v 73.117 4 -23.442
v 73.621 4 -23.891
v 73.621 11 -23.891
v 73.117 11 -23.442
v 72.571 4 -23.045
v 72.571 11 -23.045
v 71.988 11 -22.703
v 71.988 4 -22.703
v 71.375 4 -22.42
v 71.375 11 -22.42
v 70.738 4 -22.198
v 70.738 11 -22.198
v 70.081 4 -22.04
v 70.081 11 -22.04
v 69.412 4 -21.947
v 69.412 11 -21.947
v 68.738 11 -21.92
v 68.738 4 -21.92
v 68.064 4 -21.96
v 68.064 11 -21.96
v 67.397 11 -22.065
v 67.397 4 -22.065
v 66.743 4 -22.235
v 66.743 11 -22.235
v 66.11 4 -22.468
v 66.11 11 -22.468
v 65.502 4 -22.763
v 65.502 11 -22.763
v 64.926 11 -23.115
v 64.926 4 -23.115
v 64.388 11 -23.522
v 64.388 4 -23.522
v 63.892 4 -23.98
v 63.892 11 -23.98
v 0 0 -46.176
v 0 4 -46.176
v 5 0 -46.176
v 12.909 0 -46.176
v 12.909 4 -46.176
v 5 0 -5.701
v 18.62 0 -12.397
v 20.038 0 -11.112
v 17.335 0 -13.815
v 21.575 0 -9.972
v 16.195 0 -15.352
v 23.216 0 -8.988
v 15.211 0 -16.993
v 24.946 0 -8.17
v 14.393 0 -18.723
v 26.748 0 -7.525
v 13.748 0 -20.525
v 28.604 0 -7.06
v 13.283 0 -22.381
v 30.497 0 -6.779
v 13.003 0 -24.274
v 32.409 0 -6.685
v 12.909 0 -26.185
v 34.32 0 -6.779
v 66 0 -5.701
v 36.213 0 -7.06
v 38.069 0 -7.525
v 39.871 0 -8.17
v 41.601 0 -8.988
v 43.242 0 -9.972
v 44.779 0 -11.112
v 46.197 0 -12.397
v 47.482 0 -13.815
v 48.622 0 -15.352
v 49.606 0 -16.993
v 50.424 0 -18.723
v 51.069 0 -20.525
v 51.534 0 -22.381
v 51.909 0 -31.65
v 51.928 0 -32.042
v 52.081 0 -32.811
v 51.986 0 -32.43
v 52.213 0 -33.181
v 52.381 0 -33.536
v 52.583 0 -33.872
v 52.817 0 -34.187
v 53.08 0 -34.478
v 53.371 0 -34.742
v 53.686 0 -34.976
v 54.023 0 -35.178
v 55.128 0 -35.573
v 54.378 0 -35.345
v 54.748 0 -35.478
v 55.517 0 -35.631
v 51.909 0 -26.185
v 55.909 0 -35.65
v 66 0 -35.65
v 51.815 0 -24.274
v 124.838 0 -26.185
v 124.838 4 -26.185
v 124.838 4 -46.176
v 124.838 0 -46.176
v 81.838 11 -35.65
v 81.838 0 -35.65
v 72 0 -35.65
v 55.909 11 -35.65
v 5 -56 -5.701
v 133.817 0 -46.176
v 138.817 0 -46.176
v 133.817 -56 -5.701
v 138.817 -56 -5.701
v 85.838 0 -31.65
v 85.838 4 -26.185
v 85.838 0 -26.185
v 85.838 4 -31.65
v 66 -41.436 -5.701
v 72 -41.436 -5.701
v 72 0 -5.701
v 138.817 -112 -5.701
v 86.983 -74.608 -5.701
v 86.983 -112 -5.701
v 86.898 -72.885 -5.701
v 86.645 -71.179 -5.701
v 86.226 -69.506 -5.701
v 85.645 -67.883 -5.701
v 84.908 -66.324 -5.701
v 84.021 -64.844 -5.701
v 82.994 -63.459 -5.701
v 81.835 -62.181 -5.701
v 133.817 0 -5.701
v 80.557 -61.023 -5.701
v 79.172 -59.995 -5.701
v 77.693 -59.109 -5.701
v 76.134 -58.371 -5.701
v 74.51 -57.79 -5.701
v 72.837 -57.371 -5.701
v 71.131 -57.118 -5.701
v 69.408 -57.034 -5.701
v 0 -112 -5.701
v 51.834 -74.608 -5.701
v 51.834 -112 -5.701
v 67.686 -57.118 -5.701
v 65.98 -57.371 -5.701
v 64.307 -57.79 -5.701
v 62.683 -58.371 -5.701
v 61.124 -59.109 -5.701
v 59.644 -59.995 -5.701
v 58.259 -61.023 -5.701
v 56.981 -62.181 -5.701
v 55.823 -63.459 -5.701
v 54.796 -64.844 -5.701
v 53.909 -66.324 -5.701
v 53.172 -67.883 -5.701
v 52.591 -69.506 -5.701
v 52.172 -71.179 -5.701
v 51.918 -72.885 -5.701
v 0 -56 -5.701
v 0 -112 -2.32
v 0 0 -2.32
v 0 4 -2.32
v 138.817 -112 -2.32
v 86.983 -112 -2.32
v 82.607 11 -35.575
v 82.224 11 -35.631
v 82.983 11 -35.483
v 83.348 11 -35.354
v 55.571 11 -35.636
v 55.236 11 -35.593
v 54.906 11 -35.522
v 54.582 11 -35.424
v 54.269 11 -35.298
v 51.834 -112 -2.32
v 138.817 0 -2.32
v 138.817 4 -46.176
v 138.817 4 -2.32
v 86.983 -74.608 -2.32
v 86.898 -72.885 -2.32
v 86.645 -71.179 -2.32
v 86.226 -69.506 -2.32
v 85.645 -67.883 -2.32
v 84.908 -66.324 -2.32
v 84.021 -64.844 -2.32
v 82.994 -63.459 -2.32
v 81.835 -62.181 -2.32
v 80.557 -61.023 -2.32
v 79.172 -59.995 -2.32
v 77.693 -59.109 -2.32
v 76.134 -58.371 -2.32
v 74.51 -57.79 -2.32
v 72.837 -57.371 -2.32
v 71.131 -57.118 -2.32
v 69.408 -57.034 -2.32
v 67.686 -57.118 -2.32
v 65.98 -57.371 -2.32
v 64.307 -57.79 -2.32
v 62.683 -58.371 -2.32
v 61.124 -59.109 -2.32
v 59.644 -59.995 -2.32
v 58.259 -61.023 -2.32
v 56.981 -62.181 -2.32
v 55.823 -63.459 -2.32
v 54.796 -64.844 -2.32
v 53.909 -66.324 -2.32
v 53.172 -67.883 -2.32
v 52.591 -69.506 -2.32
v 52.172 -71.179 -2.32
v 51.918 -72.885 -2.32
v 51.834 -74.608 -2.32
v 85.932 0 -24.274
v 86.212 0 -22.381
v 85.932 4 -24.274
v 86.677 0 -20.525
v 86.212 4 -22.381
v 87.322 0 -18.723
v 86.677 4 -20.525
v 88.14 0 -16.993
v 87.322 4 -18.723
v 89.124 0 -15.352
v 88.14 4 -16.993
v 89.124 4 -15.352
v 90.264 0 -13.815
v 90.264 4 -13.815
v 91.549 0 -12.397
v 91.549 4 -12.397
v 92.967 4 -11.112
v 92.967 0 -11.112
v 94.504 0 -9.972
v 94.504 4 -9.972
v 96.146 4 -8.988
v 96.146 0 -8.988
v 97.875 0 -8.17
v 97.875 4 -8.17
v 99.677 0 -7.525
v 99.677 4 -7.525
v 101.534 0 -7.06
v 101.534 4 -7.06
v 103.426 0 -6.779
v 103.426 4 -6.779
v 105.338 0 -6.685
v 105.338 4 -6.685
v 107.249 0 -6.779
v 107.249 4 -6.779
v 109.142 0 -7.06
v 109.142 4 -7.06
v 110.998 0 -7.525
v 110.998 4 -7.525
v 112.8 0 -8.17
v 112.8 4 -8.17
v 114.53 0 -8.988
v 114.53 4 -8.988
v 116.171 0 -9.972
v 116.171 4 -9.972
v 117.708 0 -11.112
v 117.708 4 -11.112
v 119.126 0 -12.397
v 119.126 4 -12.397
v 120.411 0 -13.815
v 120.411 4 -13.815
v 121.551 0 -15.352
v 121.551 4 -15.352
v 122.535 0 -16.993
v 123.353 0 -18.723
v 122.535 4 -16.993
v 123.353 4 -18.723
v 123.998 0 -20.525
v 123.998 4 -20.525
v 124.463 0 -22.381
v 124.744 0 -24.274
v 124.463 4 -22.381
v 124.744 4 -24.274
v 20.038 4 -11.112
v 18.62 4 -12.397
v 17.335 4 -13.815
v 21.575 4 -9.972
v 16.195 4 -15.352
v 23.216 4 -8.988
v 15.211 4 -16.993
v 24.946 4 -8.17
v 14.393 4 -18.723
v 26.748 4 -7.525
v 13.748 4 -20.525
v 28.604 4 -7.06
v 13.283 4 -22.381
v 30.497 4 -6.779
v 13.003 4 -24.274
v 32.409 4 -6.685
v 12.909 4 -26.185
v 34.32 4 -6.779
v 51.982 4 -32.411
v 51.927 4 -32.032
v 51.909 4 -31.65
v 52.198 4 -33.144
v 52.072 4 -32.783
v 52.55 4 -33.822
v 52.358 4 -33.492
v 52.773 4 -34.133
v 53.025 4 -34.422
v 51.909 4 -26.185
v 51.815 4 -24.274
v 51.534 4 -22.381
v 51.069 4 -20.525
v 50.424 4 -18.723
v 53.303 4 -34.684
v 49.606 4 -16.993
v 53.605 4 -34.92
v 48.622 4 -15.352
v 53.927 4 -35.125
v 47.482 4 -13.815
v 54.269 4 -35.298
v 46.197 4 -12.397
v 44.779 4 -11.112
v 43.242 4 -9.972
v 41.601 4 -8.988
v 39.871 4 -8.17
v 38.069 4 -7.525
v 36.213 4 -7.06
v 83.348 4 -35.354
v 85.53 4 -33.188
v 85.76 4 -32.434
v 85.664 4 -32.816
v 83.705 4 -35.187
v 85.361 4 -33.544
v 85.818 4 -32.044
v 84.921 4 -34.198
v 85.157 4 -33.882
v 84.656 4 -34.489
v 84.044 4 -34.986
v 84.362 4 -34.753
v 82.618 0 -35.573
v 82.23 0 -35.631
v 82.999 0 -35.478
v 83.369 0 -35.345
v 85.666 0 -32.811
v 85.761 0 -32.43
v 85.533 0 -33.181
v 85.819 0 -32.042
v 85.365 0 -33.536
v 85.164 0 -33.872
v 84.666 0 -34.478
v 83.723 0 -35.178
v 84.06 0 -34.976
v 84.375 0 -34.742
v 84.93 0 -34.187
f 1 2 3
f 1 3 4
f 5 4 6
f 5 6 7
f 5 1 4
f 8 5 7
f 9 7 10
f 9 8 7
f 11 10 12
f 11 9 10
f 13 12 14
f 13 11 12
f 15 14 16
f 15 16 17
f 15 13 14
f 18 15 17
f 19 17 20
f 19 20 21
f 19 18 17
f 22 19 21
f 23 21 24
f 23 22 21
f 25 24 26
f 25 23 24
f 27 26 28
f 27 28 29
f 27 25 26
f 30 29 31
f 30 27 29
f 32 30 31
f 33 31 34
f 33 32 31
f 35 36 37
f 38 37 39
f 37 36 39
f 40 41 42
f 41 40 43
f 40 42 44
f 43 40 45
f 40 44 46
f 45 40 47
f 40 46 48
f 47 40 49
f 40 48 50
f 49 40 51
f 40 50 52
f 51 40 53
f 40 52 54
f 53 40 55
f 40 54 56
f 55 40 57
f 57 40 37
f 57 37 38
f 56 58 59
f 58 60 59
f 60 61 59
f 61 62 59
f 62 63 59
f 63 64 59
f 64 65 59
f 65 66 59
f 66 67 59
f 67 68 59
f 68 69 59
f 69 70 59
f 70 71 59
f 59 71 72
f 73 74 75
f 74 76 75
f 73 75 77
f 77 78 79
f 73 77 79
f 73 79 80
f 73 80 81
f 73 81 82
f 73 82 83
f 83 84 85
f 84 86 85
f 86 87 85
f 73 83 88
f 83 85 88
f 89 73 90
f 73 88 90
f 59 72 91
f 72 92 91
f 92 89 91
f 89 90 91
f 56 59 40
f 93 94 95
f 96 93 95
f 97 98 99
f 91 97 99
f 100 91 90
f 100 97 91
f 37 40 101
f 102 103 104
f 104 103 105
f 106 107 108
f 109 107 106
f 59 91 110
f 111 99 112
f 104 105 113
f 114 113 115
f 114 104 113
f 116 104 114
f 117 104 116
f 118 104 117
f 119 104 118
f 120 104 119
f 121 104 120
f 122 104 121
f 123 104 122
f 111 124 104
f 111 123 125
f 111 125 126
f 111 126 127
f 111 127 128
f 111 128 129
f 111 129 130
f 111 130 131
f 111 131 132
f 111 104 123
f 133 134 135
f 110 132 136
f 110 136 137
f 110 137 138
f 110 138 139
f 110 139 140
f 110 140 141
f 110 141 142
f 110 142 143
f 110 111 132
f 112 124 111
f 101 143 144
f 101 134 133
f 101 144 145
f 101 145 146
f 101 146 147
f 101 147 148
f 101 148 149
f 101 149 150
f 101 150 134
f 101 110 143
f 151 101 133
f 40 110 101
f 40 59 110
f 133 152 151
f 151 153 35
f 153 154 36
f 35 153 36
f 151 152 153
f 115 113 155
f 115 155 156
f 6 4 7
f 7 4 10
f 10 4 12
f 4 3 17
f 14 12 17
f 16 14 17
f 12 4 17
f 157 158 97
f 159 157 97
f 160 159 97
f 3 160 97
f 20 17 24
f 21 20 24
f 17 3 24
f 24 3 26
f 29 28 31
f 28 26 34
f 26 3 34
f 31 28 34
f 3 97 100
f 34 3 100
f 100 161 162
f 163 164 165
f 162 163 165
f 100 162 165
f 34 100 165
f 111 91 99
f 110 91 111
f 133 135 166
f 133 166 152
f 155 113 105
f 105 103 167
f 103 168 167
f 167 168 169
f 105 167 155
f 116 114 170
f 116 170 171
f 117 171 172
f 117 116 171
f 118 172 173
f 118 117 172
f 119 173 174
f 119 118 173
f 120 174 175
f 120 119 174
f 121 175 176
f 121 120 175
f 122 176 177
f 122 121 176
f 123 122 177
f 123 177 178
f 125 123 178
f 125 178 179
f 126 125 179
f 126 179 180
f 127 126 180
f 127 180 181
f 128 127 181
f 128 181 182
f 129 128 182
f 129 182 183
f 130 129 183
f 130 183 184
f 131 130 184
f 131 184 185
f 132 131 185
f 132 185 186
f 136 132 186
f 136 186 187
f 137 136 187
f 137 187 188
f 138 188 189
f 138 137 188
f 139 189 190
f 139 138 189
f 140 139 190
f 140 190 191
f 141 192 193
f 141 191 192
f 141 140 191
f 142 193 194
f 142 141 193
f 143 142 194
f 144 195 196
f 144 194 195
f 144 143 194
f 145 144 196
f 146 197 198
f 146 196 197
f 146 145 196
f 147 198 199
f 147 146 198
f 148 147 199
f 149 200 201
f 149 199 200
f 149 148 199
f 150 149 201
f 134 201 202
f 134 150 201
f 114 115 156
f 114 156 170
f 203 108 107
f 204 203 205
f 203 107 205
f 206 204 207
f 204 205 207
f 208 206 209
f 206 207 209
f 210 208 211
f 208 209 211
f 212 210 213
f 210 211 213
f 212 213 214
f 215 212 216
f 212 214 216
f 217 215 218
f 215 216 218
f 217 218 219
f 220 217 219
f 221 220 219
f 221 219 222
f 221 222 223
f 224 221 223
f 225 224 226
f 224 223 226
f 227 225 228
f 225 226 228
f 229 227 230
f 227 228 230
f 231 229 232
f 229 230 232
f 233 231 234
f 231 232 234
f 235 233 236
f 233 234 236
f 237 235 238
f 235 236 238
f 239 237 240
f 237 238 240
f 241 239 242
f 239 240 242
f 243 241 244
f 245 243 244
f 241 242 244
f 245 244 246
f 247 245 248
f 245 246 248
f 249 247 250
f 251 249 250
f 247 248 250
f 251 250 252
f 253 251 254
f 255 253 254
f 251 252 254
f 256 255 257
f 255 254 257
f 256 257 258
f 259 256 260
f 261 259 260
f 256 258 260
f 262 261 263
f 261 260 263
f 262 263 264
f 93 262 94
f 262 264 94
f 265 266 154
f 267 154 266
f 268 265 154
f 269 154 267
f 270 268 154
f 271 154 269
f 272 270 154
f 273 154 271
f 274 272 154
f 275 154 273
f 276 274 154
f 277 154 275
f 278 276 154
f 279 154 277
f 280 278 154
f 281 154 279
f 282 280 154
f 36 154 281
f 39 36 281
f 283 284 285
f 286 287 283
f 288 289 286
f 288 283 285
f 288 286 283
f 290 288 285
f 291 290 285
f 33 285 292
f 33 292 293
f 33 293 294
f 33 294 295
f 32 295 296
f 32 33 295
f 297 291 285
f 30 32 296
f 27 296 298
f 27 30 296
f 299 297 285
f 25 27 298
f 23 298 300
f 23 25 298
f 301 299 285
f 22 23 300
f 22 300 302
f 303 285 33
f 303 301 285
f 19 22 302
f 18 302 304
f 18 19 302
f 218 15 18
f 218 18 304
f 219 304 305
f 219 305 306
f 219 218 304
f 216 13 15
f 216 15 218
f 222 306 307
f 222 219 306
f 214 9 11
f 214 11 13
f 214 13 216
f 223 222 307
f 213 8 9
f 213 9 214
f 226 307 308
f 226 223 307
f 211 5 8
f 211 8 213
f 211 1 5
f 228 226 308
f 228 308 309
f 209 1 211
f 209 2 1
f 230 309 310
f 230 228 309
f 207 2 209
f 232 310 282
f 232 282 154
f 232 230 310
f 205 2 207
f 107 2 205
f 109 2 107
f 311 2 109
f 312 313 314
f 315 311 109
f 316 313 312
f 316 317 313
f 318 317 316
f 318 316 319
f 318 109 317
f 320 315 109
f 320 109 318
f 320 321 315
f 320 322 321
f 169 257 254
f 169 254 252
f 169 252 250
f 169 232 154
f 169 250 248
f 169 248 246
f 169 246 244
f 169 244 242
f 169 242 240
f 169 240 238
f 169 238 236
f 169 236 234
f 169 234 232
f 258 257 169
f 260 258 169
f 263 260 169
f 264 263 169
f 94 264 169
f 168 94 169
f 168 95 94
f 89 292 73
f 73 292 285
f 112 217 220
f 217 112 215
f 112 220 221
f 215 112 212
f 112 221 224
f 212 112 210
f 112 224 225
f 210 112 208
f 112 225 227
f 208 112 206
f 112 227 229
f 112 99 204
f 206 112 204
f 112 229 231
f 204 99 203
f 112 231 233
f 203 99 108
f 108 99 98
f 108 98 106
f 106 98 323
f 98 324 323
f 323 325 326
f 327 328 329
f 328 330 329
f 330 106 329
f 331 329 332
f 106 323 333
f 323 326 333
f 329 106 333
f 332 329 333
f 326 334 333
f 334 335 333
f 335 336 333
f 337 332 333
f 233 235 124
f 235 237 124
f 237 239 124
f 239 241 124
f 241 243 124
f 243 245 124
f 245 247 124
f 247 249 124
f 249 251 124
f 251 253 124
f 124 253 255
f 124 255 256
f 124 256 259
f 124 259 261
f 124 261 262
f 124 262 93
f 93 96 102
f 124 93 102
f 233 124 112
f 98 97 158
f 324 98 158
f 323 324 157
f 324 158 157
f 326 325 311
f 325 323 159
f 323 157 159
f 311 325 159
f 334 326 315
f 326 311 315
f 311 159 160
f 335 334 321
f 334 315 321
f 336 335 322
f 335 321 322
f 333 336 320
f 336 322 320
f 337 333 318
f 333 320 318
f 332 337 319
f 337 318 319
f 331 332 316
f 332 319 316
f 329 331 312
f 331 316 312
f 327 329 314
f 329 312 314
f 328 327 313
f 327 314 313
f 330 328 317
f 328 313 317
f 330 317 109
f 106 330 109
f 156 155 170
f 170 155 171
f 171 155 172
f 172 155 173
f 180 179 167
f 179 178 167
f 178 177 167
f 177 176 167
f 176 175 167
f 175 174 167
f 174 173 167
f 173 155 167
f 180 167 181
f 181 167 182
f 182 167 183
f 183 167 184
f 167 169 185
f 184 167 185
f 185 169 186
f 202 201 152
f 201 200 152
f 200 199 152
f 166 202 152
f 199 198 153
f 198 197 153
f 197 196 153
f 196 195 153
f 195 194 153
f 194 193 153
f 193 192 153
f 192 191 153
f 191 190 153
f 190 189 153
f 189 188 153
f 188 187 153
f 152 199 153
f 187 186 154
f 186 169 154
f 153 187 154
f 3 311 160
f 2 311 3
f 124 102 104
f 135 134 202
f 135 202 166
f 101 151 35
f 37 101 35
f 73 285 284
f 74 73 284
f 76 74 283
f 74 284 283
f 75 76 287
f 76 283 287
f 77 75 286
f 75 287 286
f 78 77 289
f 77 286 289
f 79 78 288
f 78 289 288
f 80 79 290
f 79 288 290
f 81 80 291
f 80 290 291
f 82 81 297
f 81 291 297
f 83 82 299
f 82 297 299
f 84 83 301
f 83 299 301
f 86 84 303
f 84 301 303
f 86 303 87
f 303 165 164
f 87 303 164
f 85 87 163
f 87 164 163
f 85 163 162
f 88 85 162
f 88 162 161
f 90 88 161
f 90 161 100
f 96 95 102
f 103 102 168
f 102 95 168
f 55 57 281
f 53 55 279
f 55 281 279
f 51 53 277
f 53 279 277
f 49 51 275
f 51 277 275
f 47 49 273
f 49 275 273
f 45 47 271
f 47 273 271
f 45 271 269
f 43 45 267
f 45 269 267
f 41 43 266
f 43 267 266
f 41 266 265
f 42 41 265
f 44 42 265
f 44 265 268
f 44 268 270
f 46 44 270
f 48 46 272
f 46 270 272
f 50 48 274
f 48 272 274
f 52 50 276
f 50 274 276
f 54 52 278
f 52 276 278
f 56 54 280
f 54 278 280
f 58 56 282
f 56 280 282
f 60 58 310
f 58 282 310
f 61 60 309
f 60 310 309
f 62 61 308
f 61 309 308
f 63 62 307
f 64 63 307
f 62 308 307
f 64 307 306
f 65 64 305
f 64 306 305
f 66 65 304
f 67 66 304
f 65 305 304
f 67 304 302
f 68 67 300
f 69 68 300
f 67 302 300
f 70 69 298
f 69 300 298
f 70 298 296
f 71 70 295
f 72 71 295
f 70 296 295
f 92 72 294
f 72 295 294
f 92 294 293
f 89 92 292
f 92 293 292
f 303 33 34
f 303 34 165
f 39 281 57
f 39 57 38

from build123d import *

# Parameters (mm, degrees)
SKETCH1_W                = 138.816596539
SKETCH1_H                = 51.704152624
BOSS_EXTRUDE1_DEPTH      = 4
SKETCH2_R                = 19.5
CUT_EXTRUDE1_DEPTH       = 4
SKETCH3_W                = 39
SKETCH3_H                = 25.518890855
CUT_EXTRUDE2_DEPTH       = 4
SKETCH4_W                = 138.816596539
SKETCH4_H                = 5.527763413
CUT_EXTRUDE3_DEPTH       = 4
CUT_EXTRUDE4_DEPTH       = 4
BOSS_EXTRUDE2_DEPTH      = 7
CUT_EXTRUDE6_DEPTH       = 10
CUT_EXTRUDE6_DEPTH_BACK  = 1
SKETCH8_W                = 41.210335228
SKETCH8_H                = 18.724016431
FILLET1_R                = 4
SKETCH9_W                = 159.262648619
SKETCH9_H                = 8.218574615
CUT_EXTRUDE7_DEPTH       = 13
SKETCH10_W               = 138.816596539
SKETCH10_H               = 3.381053597
BOSS_EXTRUDE3_DEPTH      = 112
CUT_EXTRUDE8_DEPTH       = 6
BOSS_EXTRUDE4_DEPTH      = 5
BOSS_EXTRUDE5_DEPTH      = 5
BOSS_EXTRUDE6_DEPTH      = 3
BOSS_EXTRUDE6_DEPTH_BACK = 3


with BuildPart() as part:
    # Sketch1 → Boss-Extrude1 (new body)
    with BuildSketch(Plane(origin=(0, 0, 0), x_dir=(1, 0, 0), z_dir=(0, 1, 0))):
        with Locations((69.40829827, 25.852076312)):
            Rectangle(SKETCH1_W, SKETCH1_H)
    extrude(amount=BOSS_EXTRUDE1_DEPTH)

    # Sketch2 → Cut-Extrude1 (cut)
    with BuildSketch(Plane(origin=(0, 4, 0), x_dir=(1, 0, 0), z_dir=(0, 1, 0))):
        with Locations(Location((32.40871363, 26.185261769, 0), (0, 0, 270))):
            Circle(SKETCH2_R)
        with Locations(Location((105.33778471, 26.185261769, 0), (0, 0, 270))):
            Circle(SKETCH2_R)
    extrude(amount=-CUT_EXTRUDE1_DEPTH, mode=Mode.SUBTRACT)

    # Sketch3 → Cut-Extrude2 (cut)
    with BuildSketch(Plane(origin=(0, 4, 0), x_dir=(1, 0, 0), z_dir=(0, 1, 0))):
        with Locations((32.40871363, 38.944707197)):
            Rectangle(SKETCH3_W, SKETCH3_H)
        with Locations((105.33778471, 38.944707197)):
            Rectangle(SKETCH3_W, SKETCH3_H)
    extrude(amount=-CUT_EXTRUDE2_DEPTH, mode=Mode.SUBTRACT)

    # Sketch4 → Cut-Extrude3 (cut)
    with BuildSketch(Plane(origin=(0, 4, 0), x_dir=(1, 0, 0), z_dir=(0, 1, 0))):
        with Locations((69.40829827, 48.940270918)):
            Rectangle(SKETCH4_W, SKETCH4_H)
    extrude(amount=-CUT_EXTRUDE3_DEPTH, mode=Mode.SUBTRACT)

    # Sketch5 → Cut-Extrude4 (cut)
    with BuildSketch(Plane(origin=(0, 4, 0), x_dir=(1, 0, 0), z_dir=(0, 1, 0))):
        Polygon((51.928250722, 38.363055383), (49.904010148, 40.387295957), (49.904010148, 49.123987915), (88.976343822, 49.123987915), (88.23099636, 41.297839561), (87.953832157, 40.819568311), (85.857321802, 38.348253507), (84.416556547, 36.649914887), (53.389948025, 36.649914887), align=None)
    extrude(amount=-CUT_EXTRUDE4_DEPTH, mode=Mode.SUBTRACT)

    # Sketch6 → Boss-Extrude2 (add)
    with BuildSketch(Plane(origin=(0, 4, 0), x_dir=(1, 0, 0), z_dir=(0, 1, 0))):
        with BuildLine():
            Line((53.27008085, 36.472479648), (84.296689371, 36.472479648))
            Line((84.296689371, 36.472479648), (73.621100147, 23.890682137))
            ThreePointArc((73.621100147, 23.890682137), (68.737776852, 21.92042398), (63.891562932, 23.980272094))
            Line((63.891562932, 23.980272094), (53.27008085, 36.472479648))
        make_face()
    extrude(amount=BOSS_EXTRUDE2_DEPTH)

    # Sketch8 → Cut-Extrude6 (cut, two sides: drawn at the far end of the back side and taken through both)
    with BuildSketch(Plane(origin=(0, 0, -36.649914887), x_dir=(-1, 0, 0), z_dir=(0, 0, -1)).offset(-CUT_EXTRUDE6_DEPTH_BACK)):
        with Locations((-66.917709276, 5.20508787)):
            Rectangle(SKETCH8_W, SKETCH8_H)
    extrude(amount=CUT_EXTRUDE6_DEPTH + CUT_EXTRUDE6_DEPTH_BACK, mode=Mode.SUBTRACT)

    # Fillet1
    fillet1_edges = [part.edges().sort_by_distance(p)[0] for p in [
        (85.83778471, 2, -35.649914887),
        (51.90871363, 2, -35.649914887),
    ]]
    fillet(fillet1_edges, radius=FILLET1_R)

    # Sketch9 → Cut-Extrude7 (cut)
    with BuildSketch(Plane(origin=(0, 4, 0), x_dir=(1, 0, 0), z_dir=(0, 1, 0))):
        with Locations((71.074225557, -1.789652878)):
            Rectangle(SKETCH9_W, SKETCH9_H)
    extrude(amount=-CUT_EXTRUDE7_DEPTH, mode=Mode.SUBTRACT)

    # Sketch10 → Boss-Extrude3 (add)
    with BuildSketch(Plane(origin=(0, 0, 0), x_dir=(-1, 0, 0), z_dir=(0, -1, 0))):
        with Locations((-69.40829827, 4.010161229)):
            Rectangle(SKETCH10_W, SKETCH10_H)
    extrude(amount=BOSS_EXTRUDE3_DEPTH)

    # Sketch11 → Cut-Extrude8 (cut)
    with BuildSketch(Plane(origin=(0, 0, -5.700688027), x_dir=(-1, 0, 0), z_dir=(0, 0, -1))):
        with BuildLine():
            Line((-51.833864247, -74.608061362), (-51.833864247, -112))
            Line((-51.833864247, -112), (-86.982732292, -112))
            Line((-86.982732292, -112), (-86.982732292, -74.608061362))
            ThreePointArc((-86.982732292, -74.608061362), (-69.40829827, -57.033627339), (-51.833864247, -74.608061362))
        make_face()
    extrude(amount=-CUT_EXTRUDE8_DEPTH, mode=Mode.SUBTRACT)

    # Sketch12 → Boss-Extrude4 (add)
    with BuildSketch(Plane.ZY):
        Polygon((-46.176389211, 0), (-5.700688027, 0), (-5.700688027, -56), align=None)
    extrude(amount=-BOSS_EXTRUDE4_DEPTH)

    # Sketch13 → Boss-Extrude5 (add)
    with BuildSketch(Plane(origin=(138.816596539, 0, 0), x_dir=(0, 0, -1), z_dir=(1, 0, 0))):
        Polygon((5.700688027, 0), (46.176389211, 0), (5.700688027, -56), align=None)
    extrude(amount=-BOSS_EXTRUDE5_DEPTH)

    # Sketch14 → Boss-Extrude6 (add, two sides: drawn at the far end of the back side and taken through both)
    with BuildSketch(Plane(origin=(69, 0, 0), x_dir=(0, 0, -1), z_dir=(1, 0, 0)).offset(-BOSS_EXTRUDE6_DEPTH_BACK)):
        Polygon((5.700688027, 0), (35.649914887, 0), (5.700688027, -41.436137117), align=None)
    extrude(amount=BOSS_EXTRUDE6_DEPTH + BOSS_EXTRUDE6_DEPTH_BACK)


solid = part.part
